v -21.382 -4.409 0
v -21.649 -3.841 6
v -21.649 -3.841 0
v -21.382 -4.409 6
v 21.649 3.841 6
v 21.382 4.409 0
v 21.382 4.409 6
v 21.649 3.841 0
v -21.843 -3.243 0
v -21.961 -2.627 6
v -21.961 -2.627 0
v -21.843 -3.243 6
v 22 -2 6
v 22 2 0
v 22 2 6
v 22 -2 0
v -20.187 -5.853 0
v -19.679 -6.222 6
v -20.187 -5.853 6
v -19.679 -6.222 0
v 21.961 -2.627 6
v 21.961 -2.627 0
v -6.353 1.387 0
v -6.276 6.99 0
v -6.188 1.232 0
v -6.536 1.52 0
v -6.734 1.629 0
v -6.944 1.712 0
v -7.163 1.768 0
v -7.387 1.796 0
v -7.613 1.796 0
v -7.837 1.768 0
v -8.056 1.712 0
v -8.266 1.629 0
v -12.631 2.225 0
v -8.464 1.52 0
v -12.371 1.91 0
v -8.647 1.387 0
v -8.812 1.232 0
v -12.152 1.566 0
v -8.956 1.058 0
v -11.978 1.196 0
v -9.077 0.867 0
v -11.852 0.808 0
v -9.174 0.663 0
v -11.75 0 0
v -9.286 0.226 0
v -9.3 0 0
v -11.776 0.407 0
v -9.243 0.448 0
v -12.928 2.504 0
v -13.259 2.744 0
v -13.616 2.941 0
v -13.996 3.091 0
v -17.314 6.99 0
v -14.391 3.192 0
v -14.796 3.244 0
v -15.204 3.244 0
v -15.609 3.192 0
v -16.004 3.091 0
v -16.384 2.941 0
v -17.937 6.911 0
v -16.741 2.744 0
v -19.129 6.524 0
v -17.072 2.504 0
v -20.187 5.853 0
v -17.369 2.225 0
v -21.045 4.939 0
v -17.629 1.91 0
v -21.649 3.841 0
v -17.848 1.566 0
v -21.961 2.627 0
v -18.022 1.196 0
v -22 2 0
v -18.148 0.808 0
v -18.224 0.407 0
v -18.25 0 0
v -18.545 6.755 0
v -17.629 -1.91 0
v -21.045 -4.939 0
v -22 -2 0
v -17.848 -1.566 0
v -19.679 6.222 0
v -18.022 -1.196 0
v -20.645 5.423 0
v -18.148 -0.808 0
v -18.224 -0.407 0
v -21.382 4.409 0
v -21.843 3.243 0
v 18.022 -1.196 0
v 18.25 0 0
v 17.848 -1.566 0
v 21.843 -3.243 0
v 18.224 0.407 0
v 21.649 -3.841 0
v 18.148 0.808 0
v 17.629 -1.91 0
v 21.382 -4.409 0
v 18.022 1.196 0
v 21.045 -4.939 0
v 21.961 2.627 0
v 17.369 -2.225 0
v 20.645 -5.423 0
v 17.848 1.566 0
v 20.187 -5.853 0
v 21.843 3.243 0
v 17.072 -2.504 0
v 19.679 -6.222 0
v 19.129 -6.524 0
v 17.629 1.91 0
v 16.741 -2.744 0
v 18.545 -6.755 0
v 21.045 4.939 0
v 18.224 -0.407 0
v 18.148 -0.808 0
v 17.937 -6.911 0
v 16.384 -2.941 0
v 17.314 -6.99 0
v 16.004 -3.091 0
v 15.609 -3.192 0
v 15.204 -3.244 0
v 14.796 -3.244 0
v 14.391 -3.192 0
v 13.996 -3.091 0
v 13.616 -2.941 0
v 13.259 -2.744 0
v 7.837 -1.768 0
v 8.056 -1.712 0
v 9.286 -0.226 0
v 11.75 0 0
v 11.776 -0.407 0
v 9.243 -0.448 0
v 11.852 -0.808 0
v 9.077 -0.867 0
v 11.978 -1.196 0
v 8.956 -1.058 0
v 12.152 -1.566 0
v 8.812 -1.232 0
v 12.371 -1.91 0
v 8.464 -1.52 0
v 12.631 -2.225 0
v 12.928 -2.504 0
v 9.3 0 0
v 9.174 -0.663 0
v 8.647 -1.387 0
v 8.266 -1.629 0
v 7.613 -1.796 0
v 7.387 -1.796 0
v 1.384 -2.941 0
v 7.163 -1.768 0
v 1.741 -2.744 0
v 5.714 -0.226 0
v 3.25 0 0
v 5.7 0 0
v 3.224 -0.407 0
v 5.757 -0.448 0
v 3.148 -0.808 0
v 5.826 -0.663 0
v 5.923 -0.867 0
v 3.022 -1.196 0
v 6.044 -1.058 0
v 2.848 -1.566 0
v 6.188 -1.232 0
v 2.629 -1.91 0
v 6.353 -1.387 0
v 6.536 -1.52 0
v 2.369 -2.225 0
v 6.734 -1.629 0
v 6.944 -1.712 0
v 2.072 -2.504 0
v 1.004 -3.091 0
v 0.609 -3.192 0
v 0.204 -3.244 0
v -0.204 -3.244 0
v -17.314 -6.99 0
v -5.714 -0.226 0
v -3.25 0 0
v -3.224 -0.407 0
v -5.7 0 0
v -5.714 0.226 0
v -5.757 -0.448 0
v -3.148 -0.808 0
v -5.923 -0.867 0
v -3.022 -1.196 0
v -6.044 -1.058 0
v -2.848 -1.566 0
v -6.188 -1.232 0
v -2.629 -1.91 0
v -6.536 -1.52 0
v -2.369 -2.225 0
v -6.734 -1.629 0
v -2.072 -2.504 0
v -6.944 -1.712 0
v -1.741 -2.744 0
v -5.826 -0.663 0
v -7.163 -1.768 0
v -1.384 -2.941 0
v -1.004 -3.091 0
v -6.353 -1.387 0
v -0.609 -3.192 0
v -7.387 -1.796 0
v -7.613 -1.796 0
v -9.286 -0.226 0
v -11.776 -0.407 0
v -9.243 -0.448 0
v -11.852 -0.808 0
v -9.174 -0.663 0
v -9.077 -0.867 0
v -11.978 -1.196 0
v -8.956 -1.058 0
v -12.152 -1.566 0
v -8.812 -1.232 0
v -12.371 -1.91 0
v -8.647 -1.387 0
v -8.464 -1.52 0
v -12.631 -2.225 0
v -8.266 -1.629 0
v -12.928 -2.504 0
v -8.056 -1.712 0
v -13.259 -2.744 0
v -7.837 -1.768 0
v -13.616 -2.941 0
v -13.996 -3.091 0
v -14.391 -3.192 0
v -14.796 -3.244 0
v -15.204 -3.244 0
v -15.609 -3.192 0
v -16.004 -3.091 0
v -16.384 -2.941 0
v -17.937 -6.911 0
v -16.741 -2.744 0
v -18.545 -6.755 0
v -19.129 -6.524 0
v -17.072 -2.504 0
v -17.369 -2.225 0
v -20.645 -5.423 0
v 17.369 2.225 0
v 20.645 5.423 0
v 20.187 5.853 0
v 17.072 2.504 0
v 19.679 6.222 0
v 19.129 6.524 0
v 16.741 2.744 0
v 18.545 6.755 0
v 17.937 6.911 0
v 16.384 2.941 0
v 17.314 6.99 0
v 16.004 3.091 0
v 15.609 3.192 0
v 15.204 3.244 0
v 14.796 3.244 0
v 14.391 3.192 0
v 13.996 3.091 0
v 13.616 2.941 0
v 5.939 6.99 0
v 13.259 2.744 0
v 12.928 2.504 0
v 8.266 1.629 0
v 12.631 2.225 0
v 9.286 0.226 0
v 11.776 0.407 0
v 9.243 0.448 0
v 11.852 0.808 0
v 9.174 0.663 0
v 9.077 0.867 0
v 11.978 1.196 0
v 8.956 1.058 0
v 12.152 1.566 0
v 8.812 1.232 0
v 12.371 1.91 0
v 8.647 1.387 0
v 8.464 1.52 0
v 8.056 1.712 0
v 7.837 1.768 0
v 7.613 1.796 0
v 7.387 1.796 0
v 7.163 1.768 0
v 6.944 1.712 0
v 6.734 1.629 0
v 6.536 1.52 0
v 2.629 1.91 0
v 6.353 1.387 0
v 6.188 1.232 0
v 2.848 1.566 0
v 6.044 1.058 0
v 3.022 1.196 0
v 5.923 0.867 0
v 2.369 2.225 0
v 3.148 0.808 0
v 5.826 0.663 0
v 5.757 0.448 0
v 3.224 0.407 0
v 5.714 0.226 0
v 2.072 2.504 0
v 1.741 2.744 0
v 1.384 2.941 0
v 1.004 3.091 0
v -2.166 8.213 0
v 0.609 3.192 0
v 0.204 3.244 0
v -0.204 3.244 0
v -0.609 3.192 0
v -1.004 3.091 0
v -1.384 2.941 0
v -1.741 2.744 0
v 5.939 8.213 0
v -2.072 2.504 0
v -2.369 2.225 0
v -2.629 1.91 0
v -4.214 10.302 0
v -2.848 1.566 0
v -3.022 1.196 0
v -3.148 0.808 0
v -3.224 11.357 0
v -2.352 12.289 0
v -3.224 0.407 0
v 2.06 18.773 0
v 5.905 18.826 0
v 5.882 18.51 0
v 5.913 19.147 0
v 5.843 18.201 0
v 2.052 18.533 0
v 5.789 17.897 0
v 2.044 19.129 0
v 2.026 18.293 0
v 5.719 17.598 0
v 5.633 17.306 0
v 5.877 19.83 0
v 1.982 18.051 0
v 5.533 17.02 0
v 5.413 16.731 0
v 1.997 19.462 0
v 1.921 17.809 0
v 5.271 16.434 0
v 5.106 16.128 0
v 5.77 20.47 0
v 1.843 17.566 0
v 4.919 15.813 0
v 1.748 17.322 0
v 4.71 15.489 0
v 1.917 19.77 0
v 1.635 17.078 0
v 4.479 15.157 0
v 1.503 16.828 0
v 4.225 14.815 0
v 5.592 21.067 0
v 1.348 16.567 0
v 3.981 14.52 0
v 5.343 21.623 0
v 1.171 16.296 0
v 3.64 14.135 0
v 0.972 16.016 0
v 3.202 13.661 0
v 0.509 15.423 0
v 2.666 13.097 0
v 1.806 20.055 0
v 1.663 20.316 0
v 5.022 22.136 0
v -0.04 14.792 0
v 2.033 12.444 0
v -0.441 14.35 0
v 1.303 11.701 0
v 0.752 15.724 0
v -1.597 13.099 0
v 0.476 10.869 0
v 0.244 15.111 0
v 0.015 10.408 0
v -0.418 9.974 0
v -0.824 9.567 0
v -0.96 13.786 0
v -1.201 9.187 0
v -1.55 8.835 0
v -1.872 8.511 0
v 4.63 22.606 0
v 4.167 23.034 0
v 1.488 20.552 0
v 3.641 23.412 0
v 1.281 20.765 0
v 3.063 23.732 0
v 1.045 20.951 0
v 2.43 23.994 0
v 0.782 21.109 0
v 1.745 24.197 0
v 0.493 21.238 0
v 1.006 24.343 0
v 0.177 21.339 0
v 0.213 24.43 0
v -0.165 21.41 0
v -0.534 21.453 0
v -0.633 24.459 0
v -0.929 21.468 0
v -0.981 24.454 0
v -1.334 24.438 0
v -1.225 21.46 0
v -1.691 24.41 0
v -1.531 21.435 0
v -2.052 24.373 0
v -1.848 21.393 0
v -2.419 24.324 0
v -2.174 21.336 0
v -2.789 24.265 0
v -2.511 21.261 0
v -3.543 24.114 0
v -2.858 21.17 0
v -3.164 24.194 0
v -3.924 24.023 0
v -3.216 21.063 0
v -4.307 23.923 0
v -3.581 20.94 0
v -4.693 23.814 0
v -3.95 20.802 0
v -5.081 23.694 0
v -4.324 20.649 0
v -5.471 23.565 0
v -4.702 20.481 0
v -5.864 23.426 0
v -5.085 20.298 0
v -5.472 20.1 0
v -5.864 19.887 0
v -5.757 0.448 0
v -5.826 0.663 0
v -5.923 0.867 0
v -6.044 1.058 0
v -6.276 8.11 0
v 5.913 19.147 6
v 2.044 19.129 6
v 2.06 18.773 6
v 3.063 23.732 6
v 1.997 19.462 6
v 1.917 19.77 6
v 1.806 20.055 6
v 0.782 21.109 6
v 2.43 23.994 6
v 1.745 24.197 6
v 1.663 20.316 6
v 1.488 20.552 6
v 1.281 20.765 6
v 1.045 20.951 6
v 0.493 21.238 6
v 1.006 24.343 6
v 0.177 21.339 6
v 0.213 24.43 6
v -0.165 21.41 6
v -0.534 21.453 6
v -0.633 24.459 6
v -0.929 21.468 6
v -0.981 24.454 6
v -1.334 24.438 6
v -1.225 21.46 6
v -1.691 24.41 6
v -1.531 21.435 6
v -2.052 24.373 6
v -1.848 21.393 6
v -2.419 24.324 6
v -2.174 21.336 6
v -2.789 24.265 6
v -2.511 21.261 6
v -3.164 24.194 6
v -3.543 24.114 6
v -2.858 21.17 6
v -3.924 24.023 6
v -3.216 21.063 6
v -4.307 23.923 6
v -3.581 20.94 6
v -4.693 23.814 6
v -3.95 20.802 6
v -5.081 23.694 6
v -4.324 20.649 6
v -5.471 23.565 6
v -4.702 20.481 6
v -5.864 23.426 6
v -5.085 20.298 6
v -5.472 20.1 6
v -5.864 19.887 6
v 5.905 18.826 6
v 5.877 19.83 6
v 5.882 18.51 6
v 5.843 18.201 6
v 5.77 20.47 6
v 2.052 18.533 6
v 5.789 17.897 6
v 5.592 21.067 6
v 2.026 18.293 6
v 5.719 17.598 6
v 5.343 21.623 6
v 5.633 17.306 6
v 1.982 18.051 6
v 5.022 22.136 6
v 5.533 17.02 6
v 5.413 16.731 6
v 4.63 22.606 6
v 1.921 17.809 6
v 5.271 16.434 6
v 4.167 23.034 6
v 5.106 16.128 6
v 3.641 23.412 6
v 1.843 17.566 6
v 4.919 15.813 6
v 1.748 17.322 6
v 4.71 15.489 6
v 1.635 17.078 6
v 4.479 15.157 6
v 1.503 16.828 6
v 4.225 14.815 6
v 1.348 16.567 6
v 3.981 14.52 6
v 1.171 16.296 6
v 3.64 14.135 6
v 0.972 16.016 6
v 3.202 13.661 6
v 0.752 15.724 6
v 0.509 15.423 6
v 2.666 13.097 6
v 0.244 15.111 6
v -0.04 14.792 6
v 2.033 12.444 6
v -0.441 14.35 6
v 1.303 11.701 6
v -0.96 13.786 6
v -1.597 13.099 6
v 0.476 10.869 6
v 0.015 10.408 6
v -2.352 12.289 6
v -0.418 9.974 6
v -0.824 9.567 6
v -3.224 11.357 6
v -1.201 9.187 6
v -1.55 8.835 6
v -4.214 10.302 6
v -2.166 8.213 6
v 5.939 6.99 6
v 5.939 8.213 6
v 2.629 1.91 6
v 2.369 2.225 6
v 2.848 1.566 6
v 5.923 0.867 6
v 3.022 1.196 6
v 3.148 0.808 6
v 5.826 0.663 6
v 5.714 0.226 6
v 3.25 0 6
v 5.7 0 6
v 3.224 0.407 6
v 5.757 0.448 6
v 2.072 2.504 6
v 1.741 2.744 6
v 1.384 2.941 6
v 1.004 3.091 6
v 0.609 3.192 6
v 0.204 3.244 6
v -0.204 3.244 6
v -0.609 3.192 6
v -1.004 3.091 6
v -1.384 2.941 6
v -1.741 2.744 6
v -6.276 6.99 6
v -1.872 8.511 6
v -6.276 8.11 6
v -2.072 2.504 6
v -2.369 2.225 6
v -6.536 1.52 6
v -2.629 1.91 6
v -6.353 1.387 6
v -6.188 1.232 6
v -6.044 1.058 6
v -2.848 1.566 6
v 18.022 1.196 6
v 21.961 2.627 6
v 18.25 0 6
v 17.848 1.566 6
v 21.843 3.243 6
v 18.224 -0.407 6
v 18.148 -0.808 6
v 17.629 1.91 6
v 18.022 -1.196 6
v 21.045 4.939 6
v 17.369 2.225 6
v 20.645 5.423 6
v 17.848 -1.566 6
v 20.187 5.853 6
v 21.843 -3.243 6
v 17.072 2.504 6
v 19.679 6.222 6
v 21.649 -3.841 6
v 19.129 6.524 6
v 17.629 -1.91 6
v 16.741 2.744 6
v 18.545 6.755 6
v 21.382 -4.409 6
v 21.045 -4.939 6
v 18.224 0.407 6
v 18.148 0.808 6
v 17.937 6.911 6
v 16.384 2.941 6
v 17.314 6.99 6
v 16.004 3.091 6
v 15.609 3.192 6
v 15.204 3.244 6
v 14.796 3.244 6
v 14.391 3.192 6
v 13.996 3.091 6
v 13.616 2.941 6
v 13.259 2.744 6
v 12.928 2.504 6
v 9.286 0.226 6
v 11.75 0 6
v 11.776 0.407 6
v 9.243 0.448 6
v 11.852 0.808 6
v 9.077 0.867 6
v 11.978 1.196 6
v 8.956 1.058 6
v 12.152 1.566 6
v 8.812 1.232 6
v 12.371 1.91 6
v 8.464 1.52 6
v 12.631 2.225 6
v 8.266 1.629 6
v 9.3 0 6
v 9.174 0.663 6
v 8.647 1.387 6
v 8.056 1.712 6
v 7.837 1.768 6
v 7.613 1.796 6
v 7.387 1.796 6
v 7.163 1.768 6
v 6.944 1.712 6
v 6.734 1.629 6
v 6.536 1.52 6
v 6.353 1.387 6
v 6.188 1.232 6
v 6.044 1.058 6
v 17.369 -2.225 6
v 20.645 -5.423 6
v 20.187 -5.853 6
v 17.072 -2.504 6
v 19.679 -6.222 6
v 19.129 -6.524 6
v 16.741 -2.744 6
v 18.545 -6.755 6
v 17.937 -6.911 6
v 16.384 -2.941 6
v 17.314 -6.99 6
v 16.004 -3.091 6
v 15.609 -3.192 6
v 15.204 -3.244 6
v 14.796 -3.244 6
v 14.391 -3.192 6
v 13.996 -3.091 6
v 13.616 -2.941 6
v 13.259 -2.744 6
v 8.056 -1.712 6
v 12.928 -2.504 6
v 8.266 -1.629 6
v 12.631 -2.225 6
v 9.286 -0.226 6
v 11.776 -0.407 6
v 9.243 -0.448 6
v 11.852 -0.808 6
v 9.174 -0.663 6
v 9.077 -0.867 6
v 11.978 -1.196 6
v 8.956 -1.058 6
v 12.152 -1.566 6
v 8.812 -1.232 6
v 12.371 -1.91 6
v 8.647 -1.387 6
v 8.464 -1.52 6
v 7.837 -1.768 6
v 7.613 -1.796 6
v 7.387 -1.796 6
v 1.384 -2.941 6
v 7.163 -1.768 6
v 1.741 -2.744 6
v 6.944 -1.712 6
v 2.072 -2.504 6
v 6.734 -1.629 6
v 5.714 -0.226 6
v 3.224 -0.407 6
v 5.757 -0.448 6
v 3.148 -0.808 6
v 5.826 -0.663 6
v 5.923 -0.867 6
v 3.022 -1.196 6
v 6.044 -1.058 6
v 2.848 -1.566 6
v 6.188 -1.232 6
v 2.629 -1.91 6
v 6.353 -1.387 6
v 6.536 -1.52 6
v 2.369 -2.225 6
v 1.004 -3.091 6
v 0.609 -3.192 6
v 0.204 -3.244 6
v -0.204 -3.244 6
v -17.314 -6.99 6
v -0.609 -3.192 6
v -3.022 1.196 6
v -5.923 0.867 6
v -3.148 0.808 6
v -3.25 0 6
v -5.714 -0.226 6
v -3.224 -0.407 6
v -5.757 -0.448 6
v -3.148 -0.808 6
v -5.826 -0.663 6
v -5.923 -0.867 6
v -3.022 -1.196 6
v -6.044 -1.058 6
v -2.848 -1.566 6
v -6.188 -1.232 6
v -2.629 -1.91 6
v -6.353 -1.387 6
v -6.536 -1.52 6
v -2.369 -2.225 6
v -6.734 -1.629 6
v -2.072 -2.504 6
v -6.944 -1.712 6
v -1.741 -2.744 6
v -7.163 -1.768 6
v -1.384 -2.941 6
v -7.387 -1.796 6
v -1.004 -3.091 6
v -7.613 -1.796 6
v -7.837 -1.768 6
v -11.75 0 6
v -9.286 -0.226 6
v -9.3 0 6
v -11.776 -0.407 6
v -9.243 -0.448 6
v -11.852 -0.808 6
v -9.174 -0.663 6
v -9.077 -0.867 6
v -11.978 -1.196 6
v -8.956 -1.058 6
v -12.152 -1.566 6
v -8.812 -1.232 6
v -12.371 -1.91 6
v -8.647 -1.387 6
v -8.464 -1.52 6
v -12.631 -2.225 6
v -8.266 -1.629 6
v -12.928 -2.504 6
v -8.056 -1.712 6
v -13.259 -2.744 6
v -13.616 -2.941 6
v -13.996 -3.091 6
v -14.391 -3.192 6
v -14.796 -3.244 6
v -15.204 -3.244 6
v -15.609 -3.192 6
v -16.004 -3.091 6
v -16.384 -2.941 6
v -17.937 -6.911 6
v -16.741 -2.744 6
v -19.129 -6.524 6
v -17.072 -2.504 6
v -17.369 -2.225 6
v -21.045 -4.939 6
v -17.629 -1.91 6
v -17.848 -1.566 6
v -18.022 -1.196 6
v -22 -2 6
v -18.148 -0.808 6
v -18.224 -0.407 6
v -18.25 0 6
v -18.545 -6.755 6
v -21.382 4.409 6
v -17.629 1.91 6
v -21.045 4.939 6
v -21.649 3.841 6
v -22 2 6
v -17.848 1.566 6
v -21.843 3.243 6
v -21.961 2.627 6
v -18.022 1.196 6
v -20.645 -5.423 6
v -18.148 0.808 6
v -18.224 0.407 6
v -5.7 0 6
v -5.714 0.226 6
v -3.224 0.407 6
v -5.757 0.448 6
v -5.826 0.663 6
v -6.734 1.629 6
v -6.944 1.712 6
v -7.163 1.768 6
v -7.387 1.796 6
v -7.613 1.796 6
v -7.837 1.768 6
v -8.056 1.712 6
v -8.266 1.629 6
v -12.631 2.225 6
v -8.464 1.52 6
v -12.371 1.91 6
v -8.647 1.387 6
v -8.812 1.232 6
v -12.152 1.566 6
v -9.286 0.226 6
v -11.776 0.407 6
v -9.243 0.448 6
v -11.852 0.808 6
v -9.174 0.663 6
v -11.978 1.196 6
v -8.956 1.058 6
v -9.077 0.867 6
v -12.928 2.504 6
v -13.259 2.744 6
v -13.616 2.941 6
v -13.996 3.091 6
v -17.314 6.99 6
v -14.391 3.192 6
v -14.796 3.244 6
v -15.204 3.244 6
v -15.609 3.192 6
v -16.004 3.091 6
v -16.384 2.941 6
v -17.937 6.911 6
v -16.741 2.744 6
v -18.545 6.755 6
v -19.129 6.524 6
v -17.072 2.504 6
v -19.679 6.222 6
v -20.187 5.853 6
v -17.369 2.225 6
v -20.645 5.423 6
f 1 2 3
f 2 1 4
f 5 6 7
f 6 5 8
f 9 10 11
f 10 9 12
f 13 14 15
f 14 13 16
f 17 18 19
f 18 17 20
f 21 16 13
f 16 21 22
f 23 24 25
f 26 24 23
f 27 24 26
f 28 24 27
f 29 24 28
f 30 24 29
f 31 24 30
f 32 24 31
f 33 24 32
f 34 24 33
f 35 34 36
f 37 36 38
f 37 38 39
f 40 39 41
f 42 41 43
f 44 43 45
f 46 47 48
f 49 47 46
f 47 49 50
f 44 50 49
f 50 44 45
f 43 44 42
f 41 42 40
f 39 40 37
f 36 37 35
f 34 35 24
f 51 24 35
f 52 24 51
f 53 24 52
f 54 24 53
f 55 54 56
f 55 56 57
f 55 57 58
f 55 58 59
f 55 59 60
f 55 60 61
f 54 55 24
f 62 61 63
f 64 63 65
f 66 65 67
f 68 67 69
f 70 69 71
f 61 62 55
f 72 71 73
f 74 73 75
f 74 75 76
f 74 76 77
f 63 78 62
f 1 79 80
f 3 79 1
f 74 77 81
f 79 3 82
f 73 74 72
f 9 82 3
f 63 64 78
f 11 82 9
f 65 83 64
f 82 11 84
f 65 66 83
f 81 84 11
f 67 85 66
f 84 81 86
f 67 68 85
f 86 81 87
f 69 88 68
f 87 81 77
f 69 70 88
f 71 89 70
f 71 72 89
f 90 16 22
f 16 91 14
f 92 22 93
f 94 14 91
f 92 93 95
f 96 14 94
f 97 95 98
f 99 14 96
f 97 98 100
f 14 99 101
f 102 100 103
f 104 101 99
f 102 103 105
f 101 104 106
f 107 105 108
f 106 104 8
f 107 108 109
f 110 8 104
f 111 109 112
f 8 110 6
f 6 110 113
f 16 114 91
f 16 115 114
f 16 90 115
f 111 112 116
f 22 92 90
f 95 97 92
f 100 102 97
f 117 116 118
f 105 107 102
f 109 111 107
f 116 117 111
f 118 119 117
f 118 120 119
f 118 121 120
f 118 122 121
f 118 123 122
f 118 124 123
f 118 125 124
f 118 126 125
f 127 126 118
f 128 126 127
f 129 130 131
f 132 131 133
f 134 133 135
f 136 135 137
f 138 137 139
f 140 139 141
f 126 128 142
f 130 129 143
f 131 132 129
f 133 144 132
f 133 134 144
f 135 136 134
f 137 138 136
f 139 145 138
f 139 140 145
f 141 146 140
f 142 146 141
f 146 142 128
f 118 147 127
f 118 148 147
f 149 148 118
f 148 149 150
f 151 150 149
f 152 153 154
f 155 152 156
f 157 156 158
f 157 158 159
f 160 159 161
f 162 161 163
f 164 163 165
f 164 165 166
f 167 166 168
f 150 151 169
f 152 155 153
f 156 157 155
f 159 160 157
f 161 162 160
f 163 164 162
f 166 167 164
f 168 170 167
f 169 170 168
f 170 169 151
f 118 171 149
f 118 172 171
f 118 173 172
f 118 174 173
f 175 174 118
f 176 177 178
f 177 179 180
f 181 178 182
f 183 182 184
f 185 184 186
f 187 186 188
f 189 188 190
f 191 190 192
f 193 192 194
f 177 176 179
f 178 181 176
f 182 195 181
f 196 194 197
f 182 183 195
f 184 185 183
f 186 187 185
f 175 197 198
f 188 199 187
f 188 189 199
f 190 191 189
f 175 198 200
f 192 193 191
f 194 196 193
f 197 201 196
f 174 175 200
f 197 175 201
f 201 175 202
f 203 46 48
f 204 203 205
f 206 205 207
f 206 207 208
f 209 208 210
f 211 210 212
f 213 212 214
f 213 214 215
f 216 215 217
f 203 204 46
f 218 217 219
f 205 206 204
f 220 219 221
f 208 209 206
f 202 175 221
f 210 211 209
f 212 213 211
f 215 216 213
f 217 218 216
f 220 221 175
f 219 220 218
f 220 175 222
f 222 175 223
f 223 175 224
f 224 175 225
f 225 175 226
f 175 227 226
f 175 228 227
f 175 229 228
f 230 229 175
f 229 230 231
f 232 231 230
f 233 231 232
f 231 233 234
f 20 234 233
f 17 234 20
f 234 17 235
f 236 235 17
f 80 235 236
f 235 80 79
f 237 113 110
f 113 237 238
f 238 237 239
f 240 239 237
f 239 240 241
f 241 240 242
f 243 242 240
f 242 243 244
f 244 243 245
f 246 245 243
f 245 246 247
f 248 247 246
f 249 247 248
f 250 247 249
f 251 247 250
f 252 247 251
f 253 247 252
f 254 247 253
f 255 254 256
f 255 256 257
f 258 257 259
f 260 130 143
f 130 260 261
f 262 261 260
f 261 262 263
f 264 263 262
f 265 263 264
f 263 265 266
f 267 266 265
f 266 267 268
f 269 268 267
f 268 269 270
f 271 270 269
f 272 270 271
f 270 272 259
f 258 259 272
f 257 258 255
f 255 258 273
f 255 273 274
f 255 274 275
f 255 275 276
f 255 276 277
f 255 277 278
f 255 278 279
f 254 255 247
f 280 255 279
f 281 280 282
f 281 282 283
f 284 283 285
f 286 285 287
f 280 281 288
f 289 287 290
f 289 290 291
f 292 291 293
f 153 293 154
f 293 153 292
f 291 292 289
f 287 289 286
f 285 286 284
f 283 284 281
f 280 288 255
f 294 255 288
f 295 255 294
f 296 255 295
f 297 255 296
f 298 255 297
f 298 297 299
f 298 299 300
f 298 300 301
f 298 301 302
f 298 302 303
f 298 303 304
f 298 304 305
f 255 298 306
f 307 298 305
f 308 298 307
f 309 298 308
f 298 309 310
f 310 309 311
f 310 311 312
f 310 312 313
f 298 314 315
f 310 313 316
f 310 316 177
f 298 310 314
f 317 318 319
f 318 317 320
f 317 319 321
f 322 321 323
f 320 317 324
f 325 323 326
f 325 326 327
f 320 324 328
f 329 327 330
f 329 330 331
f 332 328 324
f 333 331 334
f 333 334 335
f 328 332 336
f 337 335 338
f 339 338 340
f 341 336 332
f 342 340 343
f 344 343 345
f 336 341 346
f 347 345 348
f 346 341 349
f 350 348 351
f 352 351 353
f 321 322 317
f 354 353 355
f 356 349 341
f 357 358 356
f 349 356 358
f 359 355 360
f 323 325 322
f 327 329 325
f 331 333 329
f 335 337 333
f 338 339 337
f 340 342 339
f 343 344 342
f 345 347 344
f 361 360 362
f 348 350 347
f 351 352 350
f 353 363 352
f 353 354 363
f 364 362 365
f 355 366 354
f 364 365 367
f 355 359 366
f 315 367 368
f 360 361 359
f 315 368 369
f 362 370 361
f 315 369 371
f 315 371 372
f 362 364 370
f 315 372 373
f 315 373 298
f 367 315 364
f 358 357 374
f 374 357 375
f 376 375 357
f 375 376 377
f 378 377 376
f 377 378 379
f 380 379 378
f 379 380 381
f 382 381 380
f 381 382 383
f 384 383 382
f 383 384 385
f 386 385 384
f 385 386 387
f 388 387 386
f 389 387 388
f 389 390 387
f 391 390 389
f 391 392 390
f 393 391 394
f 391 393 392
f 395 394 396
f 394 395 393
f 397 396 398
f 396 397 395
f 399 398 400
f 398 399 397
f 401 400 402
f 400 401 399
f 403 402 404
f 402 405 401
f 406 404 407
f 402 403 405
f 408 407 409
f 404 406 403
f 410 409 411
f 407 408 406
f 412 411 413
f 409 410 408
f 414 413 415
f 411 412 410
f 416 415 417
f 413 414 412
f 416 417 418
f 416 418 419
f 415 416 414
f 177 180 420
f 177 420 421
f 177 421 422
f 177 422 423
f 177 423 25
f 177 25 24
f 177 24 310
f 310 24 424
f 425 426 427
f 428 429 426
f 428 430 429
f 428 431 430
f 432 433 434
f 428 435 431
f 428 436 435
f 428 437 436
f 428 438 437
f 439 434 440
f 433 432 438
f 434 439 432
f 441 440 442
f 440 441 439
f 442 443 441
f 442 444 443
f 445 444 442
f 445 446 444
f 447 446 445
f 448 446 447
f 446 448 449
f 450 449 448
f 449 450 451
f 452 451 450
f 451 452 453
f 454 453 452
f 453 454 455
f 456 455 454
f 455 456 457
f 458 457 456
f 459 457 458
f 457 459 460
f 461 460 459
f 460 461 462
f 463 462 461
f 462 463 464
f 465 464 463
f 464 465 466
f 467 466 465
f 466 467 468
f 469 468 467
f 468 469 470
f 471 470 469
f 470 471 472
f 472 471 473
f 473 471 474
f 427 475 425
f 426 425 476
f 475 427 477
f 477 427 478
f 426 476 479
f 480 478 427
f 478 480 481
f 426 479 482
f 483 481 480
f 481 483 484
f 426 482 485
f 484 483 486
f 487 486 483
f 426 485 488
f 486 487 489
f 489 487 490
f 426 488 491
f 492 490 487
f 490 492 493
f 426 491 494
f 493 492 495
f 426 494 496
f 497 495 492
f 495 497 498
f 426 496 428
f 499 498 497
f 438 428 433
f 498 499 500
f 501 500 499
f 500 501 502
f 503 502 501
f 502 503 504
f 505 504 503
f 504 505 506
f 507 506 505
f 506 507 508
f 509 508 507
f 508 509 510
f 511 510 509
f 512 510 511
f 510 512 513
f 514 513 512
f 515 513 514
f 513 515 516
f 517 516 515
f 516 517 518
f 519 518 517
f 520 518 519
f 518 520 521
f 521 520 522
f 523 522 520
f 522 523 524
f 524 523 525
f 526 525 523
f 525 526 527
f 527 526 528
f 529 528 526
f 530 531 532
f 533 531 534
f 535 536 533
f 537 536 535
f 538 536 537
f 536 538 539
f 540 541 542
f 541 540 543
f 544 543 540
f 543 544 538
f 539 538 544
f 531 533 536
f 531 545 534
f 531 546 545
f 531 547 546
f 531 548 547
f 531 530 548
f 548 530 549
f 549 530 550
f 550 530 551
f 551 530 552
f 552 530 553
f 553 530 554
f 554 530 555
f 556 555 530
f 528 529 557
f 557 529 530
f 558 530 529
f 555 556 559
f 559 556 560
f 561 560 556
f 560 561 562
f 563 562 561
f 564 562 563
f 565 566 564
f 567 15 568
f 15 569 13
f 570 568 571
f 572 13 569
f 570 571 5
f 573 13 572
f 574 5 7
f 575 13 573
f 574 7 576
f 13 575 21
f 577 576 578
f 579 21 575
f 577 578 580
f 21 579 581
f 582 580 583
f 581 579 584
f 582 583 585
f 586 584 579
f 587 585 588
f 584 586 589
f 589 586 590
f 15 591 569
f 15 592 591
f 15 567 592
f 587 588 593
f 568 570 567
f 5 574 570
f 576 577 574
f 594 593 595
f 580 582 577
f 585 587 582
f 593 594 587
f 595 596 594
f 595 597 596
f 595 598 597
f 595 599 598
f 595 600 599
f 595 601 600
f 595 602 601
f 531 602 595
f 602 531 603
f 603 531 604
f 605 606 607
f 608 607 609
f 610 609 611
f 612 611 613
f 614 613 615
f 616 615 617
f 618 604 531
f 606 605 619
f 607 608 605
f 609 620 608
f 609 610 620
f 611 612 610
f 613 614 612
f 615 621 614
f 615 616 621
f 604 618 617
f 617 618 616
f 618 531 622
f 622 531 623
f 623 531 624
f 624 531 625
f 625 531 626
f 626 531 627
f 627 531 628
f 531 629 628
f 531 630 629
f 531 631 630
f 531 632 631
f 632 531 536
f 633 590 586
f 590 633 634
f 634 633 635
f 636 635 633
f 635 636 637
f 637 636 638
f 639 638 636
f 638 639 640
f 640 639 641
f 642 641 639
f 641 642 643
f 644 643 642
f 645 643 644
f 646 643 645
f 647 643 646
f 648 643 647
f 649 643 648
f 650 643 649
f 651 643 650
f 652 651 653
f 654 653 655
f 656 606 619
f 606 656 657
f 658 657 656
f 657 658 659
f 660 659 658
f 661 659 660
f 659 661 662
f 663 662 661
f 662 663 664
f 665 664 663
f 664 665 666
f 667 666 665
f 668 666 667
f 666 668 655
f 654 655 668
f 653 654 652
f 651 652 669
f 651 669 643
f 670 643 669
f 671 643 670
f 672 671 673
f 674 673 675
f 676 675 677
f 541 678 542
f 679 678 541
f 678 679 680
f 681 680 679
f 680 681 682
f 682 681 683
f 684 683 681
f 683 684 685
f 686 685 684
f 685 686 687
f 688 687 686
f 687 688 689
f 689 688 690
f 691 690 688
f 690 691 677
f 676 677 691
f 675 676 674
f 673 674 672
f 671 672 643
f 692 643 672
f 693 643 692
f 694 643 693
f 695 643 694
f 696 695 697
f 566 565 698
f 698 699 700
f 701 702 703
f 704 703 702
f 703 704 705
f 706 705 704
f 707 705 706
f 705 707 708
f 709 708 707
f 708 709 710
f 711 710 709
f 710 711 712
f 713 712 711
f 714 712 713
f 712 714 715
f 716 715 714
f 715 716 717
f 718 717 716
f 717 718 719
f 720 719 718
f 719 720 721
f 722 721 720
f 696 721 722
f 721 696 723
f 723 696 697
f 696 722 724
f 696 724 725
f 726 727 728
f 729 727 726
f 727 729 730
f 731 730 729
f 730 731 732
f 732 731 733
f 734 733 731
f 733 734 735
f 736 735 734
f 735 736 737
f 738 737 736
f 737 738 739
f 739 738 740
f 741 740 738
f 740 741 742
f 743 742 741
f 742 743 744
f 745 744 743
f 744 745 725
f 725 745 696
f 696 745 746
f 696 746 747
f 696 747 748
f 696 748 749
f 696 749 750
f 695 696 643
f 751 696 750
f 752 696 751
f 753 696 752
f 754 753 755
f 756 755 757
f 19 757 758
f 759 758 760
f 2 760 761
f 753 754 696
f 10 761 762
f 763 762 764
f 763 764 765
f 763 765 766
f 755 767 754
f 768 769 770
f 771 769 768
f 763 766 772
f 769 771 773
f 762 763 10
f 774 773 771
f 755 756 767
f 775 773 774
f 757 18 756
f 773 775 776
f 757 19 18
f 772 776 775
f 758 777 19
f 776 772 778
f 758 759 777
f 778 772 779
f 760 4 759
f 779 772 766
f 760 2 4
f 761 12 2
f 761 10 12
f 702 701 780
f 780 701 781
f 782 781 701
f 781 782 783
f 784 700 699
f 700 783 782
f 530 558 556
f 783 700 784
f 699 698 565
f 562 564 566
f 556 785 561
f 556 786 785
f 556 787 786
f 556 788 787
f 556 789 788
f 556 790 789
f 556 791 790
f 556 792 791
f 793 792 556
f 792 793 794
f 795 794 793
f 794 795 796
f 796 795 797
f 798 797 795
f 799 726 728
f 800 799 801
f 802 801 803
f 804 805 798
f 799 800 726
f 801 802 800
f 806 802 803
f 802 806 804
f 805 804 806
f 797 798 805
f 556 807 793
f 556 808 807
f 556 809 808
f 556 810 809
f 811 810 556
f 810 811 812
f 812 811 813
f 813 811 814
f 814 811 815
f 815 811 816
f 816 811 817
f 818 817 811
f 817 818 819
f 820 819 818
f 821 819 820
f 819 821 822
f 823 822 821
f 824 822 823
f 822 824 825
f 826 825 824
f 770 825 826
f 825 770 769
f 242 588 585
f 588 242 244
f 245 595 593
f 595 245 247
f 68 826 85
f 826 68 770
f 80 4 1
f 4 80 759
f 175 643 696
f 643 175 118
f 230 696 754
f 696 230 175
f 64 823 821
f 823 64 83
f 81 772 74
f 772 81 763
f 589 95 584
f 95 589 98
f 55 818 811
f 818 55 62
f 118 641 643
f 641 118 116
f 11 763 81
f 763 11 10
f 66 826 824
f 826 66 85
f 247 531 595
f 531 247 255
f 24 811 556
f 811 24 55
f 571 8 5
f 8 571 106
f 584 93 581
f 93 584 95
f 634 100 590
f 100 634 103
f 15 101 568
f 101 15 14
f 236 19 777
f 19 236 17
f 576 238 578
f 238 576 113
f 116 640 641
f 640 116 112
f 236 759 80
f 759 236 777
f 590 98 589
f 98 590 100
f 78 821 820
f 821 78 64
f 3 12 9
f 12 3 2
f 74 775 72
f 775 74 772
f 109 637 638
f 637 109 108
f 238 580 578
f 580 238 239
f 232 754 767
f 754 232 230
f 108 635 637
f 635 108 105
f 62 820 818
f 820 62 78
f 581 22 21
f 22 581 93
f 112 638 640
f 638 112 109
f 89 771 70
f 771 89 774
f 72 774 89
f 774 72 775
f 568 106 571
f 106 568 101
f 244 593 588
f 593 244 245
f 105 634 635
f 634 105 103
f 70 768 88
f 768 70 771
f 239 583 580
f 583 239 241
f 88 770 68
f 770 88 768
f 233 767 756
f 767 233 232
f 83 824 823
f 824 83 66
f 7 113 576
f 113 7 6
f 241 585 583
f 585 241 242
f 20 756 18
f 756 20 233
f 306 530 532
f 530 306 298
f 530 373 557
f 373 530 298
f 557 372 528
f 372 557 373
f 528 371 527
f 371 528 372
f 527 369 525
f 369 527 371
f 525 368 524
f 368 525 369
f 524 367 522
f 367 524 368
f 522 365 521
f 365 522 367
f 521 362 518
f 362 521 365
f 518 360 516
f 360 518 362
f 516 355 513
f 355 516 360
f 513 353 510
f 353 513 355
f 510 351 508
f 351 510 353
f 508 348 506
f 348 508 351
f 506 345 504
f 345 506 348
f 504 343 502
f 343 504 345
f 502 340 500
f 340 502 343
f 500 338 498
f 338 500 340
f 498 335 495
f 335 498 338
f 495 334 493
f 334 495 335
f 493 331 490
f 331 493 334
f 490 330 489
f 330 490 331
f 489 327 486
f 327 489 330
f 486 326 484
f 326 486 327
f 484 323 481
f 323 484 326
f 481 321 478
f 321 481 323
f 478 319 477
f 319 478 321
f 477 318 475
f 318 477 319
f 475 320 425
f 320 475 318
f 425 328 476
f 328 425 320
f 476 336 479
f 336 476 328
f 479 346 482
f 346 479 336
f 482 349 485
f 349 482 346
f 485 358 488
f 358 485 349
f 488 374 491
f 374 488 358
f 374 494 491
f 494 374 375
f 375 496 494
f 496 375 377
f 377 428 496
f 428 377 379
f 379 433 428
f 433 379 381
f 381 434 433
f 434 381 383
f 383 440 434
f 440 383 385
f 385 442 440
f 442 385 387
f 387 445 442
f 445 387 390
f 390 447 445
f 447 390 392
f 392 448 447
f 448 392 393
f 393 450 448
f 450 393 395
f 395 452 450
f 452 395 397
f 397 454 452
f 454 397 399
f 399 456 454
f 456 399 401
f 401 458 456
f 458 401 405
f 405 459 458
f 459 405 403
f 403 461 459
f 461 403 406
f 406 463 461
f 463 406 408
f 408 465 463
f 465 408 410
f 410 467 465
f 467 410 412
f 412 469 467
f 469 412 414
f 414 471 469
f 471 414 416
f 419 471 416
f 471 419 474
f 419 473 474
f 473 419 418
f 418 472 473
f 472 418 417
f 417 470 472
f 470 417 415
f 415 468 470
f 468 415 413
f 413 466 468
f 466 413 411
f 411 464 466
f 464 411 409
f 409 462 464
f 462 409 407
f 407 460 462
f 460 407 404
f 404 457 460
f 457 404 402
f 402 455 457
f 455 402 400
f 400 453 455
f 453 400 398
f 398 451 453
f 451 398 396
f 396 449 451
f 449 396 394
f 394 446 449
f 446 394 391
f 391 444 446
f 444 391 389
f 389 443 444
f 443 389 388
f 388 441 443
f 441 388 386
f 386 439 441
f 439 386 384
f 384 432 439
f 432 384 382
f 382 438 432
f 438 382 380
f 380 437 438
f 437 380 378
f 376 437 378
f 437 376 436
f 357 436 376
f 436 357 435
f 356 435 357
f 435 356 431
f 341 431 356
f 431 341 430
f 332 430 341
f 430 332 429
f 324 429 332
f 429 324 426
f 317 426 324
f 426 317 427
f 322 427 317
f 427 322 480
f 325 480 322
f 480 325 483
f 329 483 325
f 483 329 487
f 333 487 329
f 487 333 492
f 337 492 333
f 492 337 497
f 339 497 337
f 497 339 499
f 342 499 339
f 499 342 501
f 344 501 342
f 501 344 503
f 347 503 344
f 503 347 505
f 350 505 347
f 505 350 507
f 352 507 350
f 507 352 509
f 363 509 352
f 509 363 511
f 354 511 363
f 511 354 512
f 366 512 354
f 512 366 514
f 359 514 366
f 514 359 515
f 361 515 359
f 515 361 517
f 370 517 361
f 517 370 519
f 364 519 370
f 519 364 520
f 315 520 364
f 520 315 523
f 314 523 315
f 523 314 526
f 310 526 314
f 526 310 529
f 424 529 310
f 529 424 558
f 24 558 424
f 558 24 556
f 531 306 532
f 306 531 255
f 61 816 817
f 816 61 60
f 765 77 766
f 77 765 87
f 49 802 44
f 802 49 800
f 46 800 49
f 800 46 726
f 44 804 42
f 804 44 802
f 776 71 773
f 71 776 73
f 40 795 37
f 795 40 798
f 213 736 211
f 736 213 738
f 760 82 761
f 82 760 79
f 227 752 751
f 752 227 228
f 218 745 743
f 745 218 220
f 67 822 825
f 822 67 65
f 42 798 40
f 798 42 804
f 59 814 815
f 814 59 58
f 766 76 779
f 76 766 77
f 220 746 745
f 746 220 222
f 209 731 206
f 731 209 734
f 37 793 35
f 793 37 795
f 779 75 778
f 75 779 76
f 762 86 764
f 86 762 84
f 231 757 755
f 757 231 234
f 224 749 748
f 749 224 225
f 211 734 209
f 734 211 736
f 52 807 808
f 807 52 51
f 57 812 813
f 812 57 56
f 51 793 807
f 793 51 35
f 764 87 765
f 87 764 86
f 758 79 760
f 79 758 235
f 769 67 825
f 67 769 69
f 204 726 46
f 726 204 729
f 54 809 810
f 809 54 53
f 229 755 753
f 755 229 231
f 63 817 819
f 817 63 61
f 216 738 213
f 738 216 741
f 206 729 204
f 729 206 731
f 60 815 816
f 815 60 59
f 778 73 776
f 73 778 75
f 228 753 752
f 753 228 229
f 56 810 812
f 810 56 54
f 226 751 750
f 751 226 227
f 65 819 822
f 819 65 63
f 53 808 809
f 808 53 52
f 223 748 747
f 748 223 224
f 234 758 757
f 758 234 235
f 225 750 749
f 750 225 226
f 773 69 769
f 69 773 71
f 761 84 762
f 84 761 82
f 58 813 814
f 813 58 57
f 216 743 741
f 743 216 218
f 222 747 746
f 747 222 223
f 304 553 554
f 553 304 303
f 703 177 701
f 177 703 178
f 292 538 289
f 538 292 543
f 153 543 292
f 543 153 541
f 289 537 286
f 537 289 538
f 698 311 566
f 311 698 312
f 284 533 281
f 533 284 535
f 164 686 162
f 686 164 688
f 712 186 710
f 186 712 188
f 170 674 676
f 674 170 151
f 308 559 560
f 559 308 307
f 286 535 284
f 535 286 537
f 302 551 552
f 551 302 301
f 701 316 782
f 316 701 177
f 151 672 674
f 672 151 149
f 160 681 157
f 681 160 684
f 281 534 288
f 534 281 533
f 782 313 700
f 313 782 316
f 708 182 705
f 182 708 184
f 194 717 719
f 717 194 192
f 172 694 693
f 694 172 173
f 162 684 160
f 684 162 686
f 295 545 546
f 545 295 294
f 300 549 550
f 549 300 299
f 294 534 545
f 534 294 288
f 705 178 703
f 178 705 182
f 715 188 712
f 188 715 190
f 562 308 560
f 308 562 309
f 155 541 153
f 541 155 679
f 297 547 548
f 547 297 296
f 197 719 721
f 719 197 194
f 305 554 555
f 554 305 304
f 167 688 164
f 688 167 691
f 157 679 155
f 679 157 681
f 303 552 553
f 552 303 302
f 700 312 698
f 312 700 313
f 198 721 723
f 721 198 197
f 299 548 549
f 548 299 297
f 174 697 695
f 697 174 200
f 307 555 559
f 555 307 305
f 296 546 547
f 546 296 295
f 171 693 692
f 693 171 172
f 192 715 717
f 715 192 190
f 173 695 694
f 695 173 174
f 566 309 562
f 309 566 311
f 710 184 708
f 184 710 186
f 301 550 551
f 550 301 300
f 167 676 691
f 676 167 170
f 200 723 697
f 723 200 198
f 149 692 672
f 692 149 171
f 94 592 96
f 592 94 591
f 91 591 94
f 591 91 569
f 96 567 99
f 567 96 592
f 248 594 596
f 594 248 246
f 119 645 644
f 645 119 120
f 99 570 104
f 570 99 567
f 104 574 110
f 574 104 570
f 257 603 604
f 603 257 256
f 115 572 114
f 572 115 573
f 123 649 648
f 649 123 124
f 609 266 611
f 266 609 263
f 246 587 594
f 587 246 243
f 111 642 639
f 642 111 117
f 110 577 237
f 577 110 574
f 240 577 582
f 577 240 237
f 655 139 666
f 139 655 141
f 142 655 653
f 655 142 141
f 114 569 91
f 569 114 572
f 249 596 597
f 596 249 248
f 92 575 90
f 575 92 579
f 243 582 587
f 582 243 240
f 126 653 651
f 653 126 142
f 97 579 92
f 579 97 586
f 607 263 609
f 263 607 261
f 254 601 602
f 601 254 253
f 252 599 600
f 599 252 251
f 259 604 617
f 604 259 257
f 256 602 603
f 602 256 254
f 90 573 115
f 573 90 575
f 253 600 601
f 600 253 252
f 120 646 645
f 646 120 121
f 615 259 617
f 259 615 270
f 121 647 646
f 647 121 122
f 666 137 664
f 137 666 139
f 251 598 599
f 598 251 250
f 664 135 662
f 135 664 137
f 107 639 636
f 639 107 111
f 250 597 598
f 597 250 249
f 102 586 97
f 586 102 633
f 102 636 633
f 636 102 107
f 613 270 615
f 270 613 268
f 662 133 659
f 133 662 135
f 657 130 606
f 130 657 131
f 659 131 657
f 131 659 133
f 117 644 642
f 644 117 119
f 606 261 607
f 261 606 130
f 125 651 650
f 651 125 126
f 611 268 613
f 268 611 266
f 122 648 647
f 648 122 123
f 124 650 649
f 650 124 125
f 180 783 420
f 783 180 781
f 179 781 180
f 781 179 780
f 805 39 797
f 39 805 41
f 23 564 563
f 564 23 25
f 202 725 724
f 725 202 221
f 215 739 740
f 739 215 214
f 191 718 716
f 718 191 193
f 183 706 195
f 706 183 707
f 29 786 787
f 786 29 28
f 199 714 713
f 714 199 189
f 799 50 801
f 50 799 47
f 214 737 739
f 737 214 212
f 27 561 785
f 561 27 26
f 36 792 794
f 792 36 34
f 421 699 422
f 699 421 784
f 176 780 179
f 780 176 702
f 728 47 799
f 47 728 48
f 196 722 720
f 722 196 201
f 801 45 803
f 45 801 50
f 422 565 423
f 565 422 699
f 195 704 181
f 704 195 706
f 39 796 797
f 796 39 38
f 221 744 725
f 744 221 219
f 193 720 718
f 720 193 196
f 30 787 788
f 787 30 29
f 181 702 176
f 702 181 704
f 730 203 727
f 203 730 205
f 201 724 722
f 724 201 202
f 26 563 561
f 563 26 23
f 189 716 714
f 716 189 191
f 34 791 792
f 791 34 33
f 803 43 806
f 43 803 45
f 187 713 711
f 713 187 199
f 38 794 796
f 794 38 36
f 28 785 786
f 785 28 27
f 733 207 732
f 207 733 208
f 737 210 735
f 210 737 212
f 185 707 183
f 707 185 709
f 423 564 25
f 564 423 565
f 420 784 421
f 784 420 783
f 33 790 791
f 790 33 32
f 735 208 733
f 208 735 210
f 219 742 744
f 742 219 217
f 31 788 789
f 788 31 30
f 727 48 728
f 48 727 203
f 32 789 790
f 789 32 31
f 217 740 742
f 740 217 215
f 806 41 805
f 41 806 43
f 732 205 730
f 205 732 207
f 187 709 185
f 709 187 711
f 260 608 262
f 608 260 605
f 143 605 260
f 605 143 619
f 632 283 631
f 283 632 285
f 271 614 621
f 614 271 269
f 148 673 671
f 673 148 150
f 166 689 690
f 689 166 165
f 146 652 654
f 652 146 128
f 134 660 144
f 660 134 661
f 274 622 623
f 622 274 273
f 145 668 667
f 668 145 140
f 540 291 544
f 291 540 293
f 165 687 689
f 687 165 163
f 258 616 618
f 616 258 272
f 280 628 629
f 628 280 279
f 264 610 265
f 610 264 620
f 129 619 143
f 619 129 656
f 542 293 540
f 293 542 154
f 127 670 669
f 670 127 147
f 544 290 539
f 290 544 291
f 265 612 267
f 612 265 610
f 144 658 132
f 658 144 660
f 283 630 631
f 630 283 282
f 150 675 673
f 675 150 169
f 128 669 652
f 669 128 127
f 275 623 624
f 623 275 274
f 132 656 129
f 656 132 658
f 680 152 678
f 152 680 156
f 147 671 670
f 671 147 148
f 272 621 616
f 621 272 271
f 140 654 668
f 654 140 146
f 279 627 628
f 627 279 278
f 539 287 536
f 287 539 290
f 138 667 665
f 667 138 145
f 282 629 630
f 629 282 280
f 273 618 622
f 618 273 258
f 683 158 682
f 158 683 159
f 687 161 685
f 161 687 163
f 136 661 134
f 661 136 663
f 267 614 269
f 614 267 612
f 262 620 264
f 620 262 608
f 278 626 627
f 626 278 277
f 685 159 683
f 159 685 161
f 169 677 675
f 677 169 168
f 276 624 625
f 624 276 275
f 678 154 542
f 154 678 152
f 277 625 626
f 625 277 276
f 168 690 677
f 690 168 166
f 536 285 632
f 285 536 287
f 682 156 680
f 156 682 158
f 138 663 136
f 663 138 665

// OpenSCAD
$fn = 50;


difference() {
	union() {
		hull() {
			translate(v = [-17.0000000000, 2.0000000000, 0]) {
				cylinder(h = 6, r = 5);
			}
			translate(v = [17.0000000000, 2.0000000000, 0]) {
				cylinder(h = 6, r = 5);
			}
			translate(v = [-17.0000000000, -2.0000000000, 0]) {
				cylinder(h = 6, r = 5);
			}
			translate(v = [17.0000000000, -2.0000000000, 0]) {
				cylinder(h = 6, r = 5);
			}
		}
		translate(v = [0, 24, 0]) {
			linear_extrude(height = 6) {
				text(font = "DejaVu Sans Mono:style=Bold", halign = "center", size = 19.0000000000, text = "2", valign = "top");
			}
		}
	}
	union() {
		translate(v = [-15.0000000000, 0.0000000000, 0]) {
			translate(v = [0, 0, -100]) {
				cylinder(h = 200, r = 3.2500000000);
			}
		}
		translate(v = [0, 0, -100]) {
			cylinder(h = 200, r = 3.2500000000);
		}
		translate(v = [15.0000000000, 0.0000000000, 0]) {
			translate(v = [0, 0, -100]) {
				cylinder(h = 200, r = 3.2500000000);
			}
		}
		translate(v = [-15.0000000000, 0.0000000000, 0]) {
			translate(v = [0, 0, -100]) {
				cylinder(h = 200, r = 1.8000000000);
			}
		}
		translate(v = [-7.5000000000, 0.0000000000, 0]) {
			translate(v = [0, 0, -100]) {
				cylinder(h = 200, r = 1.8000000000);
			}
		}
		translate(v = [0, 0, -100]) {
			cylinder(h = 200, r = 1.8000000000);
		}
		translate(v = [7.5000000000, 0.0000000000, 0]) {
			translate(v = [0, 0, -100]) {
				cylinder(h = 200, r = 1.8000000000);
			}
		}
		translate(v = [15.0000000000, 0.0000000000, 0]) {
			translate(v = [0, 0, -100]) {
				cylinder(h = 200, r = 1.8000000000);
			}
		}
	}
}
